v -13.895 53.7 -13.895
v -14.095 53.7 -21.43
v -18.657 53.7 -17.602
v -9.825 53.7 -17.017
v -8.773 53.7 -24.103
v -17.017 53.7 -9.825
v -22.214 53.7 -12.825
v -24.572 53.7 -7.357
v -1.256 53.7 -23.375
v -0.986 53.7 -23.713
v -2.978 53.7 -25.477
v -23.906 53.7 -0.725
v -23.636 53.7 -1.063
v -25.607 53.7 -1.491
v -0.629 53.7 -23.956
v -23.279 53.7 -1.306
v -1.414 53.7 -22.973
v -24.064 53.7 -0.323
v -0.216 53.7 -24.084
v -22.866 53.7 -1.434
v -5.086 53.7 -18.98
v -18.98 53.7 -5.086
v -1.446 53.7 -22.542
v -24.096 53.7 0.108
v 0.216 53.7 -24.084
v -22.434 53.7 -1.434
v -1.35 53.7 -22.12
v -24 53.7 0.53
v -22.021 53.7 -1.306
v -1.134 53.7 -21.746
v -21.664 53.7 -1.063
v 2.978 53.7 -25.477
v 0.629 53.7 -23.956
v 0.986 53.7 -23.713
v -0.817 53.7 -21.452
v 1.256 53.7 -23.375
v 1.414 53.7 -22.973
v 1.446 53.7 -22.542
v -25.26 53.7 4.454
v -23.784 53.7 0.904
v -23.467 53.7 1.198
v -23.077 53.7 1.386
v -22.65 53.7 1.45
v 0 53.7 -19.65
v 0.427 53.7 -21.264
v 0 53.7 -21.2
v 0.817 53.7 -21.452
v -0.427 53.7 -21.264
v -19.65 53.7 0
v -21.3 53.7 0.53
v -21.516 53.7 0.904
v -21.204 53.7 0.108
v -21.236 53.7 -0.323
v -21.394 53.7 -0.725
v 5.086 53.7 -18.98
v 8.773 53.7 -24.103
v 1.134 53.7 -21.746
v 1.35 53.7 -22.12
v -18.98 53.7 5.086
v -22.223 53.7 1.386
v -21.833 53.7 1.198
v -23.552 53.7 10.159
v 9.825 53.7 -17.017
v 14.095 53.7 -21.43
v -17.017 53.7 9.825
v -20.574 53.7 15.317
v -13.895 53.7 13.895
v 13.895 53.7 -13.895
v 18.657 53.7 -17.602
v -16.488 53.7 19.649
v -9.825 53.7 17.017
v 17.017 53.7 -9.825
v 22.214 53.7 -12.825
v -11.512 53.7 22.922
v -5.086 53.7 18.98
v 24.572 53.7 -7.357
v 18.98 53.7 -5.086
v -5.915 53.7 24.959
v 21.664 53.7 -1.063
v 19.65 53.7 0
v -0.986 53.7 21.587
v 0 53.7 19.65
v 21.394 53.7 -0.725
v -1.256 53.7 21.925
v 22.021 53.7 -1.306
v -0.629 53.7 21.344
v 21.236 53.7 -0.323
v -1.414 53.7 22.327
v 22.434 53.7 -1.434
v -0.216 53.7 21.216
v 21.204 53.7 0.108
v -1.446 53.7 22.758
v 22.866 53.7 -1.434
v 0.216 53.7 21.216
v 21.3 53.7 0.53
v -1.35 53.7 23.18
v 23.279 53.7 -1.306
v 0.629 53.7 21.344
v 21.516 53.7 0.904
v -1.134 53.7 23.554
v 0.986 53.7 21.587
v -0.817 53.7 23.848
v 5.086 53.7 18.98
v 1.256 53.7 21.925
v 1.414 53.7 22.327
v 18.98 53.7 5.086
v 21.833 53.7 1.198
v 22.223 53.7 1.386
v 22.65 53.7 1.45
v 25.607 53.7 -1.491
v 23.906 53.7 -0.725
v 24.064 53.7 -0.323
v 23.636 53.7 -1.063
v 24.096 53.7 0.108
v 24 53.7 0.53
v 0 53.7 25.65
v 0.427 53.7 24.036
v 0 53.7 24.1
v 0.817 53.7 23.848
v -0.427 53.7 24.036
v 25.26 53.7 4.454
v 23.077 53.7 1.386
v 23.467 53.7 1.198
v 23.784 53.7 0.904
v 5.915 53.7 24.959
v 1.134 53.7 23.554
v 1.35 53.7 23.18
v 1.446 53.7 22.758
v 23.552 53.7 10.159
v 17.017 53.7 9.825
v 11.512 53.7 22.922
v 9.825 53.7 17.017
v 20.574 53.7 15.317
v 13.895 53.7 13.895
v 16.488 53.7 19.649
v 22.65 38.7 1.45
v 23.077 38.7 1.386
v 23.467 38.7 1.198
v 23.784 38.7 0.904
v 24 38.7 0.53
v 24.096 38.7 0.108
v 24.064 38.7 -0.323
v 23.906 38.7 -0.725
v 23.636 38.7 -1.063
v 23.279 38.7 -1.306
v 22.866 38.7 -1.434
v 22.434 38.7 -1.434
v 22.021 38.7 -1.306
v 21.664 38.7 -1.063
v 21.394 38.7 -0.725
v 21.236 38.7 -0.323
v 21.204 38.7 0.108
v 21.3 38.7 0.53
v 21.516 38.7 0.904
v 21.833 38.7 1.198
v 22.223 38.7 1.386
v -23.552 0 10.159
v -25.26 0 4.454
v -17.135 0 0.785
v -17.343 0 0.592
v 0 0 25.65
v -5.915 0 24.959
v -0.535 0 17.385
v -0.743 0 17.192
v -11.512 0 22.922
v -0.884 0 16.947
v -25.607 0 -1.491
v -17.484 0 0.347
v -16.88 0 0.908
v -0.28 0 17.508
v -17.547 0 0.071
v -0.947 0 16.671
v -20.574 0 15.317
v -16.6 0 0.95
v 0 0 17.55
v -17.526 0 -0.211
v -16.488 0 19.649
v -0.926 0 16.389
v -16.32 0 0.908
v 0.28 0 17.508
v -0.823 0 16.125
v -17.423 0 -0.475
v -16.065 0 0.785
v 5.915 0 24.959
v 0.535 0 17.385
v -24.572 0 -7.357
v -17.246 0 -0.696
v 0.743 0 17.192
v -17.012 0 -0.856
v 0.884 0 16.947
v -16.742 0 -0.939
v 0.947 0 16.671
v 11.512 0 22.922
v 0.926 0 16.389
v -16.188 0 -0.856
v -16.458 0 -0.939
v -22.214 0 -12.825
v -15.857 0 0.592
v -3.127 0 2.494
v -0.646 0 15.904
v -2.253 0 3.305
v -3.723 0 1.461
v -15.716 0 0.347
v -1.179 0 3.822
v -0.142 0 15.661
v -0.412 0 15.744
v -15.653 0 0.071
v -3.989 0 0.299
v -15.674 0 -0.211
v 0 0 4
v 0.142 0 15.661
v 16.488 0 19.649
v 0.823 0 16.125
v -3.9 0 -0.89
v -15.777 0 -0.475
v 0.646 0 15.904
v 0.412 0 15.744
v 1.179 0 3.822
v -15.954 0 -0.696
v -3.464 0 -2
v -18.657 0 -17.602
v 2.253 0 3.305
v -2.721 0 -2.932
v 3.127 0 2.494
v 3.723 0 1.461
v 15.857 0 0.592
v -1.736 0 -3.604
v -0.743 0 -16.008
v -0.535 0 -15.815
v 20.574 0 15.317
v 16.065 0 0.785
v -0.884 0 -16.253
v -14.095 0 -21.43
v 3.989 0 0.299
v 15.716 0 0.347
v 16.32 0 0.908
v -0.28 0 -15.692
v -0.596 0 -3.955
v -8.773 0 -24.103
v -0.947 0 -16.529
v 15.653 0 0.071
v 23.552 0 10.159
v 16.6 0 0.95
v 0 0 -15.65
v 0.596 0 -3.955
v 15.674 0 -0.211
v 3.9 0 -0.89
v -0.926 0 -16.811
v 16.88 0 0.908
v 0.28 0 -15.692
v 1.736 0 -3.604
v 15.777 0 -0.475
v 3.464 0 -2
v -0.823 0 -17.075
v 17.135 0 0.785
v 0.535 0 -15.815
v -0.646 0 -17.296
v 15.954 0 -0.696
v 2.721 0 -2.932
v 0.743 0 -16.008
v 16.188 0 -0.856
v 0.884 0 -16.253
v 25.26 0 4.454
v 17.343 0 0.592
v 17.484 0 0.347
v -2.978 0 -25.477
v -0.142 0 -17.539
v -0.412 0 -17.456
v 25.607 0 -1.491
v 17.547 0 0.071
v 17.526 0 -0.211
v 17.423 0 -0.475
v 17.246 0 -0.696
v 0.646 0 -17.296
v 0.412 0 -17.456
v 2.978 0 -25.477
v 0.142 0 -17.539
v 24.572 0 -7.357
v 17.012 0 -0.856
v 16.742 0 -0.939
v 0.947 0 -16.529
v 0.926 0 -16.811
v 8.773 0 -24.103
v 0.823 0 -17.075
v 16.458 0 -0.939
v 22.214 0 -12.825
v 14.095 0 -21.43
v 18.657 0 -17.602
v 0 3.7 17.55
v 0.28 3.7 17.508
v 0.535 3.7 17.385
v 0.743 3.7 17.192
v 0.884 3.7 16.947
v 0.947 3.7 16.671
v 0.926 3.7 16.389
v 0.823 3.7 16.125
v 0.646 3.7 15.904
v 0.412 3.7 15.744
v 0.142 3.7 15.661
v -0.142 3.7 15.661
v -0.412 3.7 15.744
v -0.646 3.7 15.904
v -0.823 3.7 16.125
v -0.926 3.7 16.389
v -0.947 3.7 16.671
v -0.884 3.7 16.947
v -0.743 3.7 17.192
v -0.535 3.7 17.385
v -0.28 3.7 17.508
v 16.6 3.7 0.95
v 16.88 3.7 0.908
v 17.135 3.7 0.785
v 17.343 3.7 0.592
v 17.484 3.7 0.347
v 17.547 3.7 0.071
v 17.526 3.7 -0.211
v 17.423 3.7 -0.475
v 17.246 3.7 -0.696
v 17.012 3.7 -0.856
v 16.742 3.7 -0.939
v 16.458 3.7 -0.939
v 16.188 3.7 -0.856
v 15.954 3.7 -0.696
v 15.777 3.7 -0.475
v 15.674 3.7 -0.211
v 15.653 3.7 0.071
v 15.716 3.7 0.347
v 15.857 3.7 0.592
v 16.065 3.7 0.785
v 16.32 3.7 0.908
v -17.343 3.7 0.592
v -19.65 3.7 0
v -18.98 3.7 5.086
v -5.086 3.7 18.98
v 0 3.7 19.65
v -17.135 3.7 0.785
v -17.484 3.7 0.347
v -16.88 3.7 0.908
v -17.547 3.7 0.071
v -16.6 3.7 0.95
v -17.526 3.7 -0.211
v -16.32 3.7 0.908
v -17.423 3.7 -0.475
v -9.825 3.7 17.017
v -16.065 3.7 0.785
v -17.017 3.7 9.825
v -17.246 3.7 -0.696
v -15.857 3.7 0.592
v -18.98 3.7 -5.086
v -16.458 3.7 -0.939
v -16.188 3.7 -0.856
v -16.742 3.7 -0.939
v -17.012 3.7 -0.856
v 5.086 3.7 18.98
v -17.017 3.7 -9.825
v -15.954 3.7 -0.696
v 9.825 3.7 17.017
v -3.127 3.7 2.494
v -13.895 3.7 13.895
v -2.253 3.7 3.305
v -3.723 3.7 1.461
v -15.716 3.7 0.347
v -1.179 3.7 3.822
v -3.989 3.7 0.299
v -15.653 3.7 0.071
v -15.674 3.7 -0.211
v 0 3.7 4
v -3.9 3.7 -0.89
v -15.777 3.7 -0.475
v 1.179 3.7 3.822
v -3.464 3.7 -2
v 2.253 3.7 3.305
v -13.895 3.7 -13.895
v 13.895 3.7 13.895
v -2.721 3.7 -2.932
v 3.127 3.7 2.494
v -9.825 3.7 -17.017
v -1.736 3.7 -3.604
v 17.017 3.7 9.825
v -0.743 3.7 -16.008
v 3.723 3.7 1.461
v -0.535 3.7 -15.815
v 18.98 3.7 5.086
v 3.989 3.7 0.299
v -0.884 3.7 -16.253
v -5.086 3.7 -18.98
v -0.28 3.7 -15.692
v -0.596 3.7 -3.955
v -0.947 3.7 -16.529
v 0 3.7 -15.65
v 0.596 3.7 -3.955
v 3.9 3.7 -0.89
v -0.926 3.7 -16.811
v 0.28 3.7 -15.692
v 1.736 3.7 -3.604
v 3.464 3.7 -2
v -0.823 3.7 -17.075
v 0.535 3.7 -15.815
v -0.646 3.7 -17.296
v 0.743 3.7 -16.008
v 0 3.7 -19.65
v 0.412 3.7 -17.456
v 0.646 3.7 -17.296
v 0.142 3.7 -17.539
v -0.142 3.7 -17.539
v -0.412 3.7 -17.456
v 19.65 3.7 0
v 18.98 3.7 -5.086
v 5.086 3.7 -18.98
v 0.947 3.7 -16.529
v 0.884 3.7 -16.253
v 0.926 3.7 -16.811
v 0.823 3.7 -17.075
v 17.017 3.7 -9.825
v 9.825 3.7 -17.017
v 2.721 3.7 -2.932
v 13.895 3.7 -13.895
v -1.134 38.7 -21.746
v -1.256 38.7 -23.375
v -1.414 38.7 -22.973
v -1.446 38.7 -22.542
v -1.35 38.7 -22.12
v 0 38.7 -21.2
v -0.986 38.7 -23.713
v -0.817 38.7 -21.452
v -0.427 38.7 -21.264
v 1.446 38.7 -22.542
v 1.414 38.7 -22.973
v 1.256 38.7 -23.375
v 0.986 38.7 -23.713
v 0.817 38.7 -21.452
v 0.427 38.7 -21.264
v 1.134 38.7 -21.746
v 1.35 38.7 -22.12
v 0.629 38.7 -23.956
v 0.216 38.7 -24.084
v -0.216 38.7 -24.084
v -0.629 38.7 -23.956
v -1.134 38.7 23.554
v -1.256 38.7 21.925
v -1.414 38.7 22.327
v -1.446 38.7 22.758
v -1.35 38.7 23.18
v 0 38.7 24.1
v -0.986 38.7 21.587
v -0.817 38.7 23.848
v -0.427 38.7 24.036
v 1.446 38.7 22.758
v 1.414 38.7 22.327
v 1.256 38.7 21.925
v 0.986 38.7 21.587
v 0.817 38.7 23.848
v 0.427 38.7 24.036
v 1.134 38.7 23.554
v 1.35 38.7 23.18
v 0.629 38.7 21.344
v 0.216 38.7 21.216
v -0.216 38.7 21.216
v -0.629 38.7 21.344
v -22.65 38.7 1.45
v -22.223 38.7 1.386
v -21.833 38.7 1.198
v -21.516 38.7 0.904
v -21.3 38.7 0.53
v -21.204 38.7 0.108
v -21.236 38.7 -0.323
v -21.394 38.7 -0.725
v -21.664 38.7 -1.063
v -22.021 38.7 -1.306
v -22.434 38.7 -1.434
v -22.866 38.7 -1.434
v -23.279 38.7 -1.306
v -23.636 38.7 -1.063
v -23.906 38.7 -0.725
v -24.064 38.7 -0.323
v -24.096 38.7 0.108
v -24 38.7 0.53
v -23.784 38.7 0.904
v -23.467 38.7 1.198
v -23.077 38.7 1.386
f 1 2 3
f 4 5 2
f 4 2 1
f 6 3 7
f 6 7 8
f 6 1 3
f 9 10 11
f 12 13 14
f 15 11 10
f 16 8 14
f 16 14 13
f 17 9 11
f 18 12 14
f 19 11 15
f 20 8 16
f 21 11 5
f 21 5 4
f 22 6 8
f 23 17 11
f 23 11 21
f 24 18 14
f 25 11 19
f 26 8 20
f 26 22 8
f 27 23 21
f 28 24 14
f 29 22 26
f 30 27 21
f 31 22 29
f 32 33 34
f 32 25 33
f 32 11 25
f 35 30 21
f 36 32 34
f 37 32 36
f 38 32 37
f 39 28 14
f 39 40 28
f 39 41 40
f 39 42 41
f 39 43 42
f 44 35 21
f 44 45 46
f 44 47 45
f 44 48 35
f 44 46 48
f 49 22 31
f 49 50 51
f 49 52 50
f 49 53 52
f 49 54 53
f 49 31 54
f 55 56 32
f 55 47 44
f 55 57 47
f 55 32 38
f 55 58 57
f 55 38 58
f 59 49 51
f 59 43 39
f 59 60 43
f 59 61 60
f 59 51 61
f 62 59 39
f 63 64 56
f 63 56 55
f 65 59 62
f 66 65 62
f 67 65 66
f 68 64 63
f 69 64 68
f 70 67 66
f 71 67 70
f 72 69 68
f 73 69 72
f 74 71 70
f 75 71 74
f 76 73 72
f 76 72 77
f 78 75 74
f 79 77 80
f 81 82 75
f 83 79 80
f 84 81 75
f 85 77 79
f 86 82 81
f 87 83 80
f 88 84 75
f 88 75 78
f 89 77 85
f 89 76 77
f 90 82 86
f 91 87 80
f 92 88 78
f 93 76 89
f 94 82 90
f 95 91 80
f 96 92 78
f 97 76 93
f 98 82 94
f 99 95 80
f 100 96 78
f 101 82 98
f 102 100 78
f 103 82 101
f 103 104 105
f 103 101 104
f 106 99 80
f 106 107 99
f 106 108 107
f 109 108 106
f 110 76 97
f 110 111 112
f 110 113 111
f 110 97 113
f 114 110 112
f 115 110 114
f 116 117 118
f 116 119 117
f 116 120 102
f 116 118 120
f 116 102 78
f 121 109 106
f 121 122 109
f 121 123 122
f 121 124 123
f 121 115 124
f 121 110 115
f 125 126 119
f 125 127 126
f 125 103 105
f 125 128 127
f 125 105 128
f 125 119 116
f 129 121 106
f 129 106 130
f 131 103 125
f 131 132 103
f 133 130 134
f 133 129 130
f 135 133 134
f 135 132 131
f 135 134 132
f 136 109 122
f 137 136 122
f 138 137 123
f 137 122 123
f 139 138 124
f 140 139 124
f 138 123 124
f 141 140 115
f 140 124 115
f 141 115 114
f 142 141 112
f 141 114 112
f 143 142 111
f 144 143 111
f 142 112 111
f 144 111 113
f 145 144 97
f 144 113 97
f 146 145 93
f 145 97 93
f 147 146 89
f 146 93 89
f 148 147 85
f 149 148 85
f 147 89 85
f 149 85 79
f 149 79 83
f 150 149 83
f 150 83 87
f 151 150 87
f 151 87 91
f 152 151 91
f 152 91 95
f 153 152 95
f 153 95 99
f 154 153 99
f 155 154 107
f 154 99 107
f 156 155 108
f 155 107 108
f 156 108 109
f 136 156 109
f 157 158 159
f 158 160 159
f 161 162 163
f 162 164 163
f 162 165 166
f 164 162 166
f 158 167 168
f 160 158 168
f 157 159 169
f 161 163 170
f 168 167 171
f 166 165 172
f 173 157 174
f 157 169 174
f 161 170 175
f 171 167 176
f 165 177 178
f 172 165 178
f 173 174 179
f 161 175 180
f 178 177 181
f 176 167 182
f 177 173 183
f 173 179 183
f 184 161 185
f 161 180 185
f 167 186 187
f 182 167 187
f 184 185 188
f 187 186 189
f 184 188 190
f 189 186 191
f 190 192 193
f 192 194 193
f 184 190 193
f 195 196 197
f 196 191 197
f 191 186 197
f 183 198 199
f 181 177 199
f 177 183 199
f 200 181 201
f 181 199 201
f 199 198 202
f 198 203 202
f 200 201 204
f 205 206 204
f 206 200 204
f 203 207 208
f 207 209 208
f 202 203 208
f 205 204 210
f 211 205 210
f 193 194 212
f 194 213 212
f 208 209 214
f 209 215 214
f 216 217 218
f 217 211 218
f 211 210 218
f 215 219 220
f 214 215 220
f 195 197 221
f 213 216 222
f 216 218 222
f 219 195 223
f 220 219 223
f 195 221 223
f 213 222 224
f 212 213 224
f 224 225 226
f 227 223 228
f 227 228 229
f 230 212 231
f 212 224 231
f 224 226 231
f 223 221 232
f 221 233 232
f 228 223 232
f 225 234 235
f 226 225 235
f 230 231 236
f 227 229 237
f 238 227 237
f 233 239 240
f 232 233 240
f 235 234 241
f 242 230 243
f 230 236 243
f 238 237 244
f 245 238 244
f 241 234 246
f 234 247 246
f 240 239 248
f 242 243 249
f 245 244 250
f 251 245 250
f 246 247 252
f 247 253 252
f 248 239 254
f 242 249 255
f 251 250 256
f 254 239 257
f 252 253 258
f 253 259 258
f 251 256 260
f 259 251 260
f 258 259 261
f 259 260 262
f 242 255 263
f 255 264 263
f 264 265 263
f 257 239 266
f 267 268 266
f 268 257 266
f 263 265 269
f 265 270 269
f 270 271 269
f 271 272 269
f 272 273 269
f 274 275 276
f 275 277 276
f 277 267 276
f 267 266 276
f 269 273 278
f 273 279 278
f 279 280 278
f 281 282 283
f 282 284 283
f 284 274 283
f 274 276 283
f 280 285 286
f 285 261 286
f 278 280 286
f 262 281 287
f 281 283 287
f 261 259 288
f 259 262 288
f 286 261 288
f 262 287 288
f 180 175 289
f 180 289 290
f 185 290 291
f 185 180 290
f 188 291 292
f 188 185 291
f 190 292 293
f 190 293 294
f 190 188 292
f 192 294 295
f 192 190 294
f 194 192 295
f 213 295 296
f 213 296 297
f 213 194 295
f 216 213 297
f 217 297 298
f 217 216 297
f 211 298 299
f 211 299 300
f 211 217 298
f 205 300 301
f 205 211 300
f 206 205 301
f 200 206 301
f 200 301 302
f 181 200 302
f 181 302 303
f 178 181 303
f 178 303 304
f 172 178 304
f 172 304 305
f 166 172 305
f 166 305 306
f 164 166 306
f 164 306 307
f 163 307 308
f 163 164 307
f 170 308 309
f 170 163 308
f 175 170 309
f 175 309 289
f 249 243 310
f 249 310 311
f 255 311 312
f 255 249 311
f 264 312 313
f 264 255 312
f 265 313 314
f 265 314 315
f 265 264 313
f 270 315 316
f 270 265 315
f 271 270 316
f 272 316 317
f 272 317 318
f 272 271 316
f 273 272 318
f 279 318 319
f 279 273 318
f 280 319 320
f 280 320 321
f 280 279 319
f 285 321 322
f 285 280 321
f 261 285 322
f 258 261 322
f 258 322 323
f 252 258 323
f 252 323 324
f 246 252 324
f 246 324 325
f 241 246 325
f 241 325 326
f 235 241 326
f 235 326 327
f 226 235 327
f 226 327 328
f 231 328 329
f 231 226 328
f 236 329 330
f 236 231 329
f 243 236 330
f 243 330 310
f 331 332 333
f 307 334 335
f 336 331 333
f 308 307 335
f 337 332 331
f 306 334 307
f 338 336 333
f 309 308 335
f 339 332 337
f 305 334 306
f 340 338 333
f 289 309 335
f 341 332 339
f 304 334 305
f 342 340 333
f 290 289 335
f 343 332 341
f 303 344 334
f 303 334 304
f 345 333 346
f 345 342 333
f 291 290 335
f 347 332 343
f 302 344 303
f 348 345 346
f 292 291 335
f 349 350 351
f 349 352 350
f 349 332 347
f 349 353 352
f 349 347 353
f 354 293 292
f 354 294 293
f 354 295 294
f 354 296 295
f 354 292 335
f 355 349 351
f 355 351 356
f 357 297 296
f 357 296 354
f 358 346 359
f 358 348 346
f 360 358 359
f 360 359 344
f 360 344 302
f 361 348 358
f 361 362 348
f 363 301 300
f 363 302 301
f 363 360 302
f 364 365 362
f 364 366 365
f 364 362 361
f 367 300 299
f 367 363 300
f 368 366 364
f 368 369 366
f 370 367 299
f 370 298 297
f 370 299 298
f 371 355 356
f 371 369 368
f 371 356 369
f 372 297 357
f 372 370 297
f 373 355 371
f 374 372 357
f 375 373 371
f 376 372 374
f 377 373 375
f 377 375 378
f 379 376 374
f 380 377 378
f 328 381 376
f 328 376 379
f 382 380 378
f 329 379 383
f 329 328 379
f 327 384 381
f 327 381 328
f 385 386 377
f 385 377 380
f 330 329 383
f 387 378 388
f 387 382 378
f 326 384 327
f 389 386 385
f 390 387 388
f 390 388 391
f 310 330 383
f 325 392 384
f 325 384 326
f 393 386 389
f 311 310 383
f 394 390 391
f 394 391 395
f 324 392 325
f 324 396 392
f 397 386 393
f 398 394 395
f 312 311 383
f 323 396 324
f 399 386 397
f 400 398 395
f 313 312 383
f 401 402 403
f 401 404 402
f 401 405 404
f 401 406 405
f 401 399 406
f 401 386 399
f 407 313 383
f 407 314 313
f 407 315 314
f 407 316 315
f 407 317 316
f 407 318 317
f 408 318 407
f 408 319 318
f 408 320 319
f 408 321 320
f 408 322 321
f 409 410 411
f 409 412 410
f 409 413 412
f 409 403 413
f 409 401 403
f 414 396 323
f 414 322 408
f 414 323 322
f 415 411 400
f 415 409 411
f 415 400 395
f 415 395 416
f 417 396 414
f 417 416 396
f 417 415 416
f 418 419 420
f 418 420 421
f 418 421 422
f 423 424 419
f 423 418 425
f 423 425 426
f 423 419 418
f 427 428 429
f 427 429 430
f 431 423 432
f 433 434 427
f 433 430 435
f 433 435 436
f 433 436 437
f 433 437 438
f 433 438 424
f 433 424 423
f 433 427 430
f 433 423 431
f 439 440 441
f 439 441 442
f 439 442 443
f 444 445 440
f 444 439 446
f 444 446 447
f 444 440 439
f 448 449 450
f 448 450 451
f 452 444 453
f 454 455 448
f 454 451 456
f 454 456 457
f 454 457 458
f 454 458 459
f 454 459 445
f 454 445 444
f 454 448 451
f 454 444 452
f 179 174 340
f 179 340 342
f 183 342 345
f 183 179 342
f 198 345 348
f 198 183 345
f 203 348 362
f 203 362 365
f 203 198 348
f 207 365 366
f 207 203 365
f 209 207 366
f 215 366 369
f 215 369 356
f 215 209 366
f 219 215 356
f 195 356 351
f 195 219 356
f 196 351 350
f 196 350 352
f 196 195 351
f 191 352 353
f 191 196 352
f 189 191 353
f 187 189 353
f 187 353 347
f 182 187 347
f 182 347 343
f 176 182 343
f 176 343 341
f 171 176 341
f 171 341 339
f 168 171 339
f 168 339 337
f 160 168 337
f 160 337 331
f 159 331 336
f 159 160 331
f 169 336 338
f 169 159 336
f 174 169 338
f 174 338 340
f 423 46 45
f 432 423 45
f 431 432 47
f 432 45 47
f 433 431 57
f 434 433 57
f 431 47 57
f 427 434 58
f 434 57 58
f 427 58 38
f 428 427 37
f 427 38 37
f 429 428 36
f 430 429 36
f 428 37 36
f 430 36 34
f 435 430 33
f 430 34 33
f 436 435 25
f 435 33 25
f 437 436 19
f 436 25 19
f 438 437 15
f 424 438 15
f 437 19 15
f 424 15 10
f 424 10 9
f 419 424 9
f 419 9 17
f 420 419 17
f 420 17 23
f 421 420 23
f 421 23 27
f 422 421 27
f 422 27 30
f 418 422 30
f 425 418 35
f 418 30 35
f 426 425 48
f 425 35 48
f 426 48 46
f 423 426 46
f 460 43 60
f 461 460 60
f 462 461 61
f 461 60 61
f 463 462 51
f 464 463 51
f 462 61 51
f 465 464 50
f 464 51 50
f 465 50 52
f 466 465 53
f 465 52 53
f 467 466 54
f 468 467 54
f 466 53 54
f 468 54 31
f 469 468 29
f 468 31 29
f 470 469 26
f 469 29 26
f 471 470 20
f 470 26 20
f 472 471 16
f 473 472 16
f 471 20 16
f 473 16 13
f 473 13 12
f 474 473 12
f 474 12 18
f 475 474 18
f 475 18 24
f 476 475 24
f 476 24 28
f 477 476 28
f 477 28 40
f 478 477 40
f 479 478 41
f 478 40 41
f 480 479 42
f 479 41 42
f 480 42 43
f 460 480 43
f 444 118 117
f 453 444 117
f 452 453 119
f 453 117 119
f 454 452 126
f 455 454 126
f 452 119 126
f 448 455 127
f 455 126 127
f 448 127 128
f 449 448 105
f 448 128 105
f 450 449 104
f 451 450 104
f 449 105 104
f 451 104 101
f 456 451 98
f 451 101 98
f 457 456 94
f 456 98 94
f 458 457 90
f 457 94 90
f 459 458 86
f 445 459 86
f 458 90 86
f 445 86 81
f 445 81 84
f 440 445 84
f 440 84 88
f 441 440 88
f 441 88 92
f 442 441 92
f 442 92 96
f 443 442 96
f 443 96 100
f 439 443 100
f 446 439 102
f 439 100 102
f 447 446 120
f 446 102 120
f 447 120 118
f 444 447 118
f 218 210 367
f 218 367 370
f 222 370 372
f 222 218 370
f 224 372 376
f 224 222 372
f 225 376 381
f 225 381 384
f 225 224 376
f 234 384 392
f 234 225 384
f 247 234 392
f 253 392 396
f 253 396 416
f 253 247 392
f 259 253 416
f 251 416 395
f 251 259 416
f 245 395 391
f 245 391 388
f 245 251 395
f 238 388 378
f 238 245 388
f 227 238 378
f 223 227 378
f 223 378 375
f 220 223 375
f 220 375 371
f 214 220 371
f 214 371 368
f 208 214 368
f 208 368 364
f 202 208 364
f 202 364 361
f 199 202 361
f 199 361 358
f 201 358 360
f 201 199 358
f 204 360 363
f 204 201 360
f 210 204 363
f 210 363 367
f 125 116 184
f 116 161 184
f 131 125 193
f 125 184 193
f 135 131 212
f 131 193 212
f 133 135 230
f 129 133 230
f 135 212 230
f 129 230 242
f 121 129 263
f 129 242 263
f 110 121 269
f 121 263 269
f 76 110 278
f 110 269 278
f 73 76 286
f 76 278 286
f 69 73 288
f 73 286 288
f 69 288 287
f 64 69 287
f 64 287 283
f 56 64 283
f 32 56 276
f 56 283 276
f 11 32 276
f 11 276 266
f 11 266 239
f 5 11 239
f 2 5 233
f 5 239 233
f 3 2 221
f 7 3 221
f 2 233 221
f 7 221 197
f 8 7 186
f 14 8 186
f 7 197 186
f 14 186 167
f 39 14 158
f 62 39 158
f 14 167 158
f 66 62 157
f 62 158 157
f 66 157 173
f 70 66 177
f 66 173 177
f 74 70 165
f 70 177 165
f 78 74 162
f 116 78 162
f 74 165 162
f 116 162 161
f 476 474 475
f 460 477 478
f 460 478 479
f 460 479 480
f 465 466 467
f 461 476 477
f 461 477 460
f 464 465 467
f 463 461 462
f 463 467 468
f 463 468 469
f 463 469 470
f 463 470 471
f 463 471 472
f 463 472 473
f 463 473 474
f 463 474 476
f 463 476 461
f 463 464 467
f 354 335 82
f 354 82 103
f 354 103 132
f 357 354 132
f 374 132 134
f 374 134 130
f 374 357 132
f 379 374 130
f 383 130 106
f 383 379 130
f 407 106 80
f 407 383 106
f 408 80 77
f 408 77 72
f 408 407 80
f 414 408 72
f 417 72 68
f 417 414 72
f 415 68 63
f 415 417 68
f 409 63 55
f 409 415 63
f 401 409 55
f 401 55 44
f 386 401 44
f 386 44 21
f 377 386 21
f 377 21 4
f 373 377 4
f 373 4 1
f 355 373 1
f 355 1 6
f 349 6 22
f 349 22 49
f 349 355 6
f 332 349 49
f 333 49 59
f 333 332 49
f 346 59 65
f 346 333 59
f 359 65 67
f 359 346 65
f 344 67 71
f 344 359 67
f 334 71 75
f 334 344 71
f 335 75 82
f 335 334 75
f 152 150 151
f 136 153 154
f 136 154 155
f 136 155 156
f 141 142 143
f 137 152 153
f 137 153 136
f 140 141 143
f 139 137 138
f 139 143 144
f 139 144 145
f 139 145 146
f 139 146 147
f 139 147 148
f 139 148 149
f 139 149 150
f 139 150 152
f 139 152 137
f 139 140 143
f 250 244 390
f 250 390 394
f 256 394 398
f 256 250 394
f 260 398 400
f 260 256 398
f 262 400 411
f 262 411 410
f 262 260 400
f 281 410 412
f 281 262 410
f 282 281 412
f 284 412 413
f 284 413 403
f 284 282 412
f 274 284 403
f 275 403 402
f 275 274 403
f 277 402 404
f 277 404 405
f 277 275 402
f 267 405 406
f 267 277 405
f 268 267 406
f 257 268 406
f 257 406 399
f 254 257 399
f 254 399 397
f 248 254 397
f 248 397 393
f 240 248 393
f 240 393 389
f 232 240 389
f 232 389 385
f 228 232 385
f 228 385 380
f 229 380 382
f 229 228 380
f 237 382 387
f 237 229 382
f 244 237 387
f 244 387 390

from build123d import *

# Parameters (mm, degrees)
SKETCH1_R           = 25.65
SKETCH1_R_2         = 19.65
SKETCH1_R_3         = 4
SKETCH1_R_4         = 0.95
BOSS_EXTRUDE1_DEPTH = 3.7
SKETCH2_R           = 25.65
SKETCH2_R_2         = 19.65
SKETCH2_R_3         = 4
SKETCH2_R_4         = 0.95
BOSS_EXTRUDE2_DEPTH = 50
SKETCH3_R           = 1.45
CUT_EXTRUDE1_DEPTH  = 15


with BuildPart() as part:
    # Sketch1 → Boss-Extrude1 (new body)
    # profile 1 of 2: a face of its own
    with BuildSketch(Plane(origin=(0, 0, 0), x_dir=(1, 0, 0), z_dir=(0, 1, 0))):
        with Locations(Location((0, 0, 0), (0, 0, 270))):
            Circle(SKETCH1_R)
        Circle(SKETCH1_R_2, mode=Mode.SUBTRACT)
    # profile 2 of 2: a face of its own
    with BuildSketch(Plane(origin=(0, 0, 0), x_dir=(1, 0, 0), z_dir=(0, 1, 0))):
        Circle(SKETCH1_R_2)
        with Locations(Location((0, 0, 0), (0, 0, 270))):
            Circle(SKETCH1_R_3, mode=Mode.SUBTRACT)
        with Locations(Location((16.6, 0, 0), (0, 0, 270))):
            Circle(SKETCH1_R_4, mode=Mode.SUBTRACT)
        with Locations(Location((0, -16.6, 0), (0, 0, 270))):
            Circle(SKETCH1_R_4, mode=Mode.SUBTRACT)
        with Locations(Location((-16.6, 0, 0), (0, 0, 270))):
            Circle(SKETCH1_R_4, mode=Mode.SUBTRACT)
        with Locations(Location((0, 16.6, 0), (0, 0, 270))):
            Circle(SKETCH1_R_4, mode=Mode.SUBTRACT)
    extrude(amount=BOSS_EXTRUDE1_DEPTH)

    # Sketch2 → Boss-Extrude2 (add)
    # profile 1 of 6: a face of its own
    with BuildSketch(Plane(origin=(0, 3.7, 0), x_dir=(1, 0, 0), z_dir=(0, 1, 0))):
        with Locations(Location((0, 0, 0), (0, 0, 270))):
            Circle(SKETCH2_R)
        with Locations(Location((0, 0, 0), (0, 0, 270))):
            Circle(SKETCH2_R_2, mode=Mode.SUBTRACT)
    # profile 2 of 6: a face of its own
    with BuildSketch(Plane(origin=(0, 3.7, 0), x_dir=(1, 0, 0), z_dir=(0, 1, 0))):
        with Locations(Location((0, 0, 0), (0, 0, 270))):
            Circle(SKETCH2_R_3)
    # profile 3 of 6: a face of its own
    with BuildSketch(Plane(origin=(0, 3.7, 0), x_dir=(1, 0, 0), z_dir=(0, 1, 0))):
        with Locations(Location((0, 16.6, 0), (0, 0, 270))):
            Circle(SKETCH2_R_4)
    # profile 4 of 6: a face of its own
    with BuildSketch(Plane(origin=(0, 3.7, 0), x_dir=(1, 0, 0), z_dir=(0, 1, 0))):
        with Locations(Location((-16.6, 0, 0), (0, 0, 270))):
            Circle(SKETCH2_R_4)
    # profile 5 of 6: a face of its own
    with BuildSketch(Plane(origin=(0, 3.7, 0), x_dir=(1, 0, 0), z_dir=(0, 1, 0))):
        with Locations(Location((0, -16.6, 0), (0, 0, 270))):
            Circle(SKETCH2_R_4)
    # profile 6 of 6: a face of its own
    with BuildSketch(Plane(origin=(0, 3.7, 0), x_dir=(1, 0, 0), z_dir=(0, 1, 0))):
        with Locations(Location((16.6, 0, 0), (0, 0, 270))):
            Circle(SKETCH2_R_4)
    extrude(amount=BOSS_EXTRUDE2_DEPTH)


with BuildPart() as boss_extrude2_kept_piece:
    # of the separate pieces the step leaves, the one the design keeps (boss_extrude2_pieces_kept)
    add(part.part.solids().sort_by_distance((0, 0, 25.65))[0])

    # Sketch3 → Cut-Extrude1 (cut)
    with BuildSketch(Plane(origin=(0, 53.7, 0), x_dir=(1, 0, 0), z_dir=(0, 1, 0))):
        with Locations(Location((22.65, 0, 0), (0, 0, 270))):
            Circle(SKETCH3_R)
        with Locations(Location((0, -22.65, 0), (0, 0, 270))):
            Circle(SKETCH3_R)
        with Locations(Location((-22.65, 0, 0), (0, 0, 270))):
            Circle(SKETCH3_R)
        with Locations(Location((0, 22.65, 0), (0, 0, 270))):
            Circle(SKETCH3_R)
    extrude(amount=-CUT_EXTRUDE1_DEPTH, mode=Mode.SUBTRACT)


solid = boss_extrude2_kept_piece.part
